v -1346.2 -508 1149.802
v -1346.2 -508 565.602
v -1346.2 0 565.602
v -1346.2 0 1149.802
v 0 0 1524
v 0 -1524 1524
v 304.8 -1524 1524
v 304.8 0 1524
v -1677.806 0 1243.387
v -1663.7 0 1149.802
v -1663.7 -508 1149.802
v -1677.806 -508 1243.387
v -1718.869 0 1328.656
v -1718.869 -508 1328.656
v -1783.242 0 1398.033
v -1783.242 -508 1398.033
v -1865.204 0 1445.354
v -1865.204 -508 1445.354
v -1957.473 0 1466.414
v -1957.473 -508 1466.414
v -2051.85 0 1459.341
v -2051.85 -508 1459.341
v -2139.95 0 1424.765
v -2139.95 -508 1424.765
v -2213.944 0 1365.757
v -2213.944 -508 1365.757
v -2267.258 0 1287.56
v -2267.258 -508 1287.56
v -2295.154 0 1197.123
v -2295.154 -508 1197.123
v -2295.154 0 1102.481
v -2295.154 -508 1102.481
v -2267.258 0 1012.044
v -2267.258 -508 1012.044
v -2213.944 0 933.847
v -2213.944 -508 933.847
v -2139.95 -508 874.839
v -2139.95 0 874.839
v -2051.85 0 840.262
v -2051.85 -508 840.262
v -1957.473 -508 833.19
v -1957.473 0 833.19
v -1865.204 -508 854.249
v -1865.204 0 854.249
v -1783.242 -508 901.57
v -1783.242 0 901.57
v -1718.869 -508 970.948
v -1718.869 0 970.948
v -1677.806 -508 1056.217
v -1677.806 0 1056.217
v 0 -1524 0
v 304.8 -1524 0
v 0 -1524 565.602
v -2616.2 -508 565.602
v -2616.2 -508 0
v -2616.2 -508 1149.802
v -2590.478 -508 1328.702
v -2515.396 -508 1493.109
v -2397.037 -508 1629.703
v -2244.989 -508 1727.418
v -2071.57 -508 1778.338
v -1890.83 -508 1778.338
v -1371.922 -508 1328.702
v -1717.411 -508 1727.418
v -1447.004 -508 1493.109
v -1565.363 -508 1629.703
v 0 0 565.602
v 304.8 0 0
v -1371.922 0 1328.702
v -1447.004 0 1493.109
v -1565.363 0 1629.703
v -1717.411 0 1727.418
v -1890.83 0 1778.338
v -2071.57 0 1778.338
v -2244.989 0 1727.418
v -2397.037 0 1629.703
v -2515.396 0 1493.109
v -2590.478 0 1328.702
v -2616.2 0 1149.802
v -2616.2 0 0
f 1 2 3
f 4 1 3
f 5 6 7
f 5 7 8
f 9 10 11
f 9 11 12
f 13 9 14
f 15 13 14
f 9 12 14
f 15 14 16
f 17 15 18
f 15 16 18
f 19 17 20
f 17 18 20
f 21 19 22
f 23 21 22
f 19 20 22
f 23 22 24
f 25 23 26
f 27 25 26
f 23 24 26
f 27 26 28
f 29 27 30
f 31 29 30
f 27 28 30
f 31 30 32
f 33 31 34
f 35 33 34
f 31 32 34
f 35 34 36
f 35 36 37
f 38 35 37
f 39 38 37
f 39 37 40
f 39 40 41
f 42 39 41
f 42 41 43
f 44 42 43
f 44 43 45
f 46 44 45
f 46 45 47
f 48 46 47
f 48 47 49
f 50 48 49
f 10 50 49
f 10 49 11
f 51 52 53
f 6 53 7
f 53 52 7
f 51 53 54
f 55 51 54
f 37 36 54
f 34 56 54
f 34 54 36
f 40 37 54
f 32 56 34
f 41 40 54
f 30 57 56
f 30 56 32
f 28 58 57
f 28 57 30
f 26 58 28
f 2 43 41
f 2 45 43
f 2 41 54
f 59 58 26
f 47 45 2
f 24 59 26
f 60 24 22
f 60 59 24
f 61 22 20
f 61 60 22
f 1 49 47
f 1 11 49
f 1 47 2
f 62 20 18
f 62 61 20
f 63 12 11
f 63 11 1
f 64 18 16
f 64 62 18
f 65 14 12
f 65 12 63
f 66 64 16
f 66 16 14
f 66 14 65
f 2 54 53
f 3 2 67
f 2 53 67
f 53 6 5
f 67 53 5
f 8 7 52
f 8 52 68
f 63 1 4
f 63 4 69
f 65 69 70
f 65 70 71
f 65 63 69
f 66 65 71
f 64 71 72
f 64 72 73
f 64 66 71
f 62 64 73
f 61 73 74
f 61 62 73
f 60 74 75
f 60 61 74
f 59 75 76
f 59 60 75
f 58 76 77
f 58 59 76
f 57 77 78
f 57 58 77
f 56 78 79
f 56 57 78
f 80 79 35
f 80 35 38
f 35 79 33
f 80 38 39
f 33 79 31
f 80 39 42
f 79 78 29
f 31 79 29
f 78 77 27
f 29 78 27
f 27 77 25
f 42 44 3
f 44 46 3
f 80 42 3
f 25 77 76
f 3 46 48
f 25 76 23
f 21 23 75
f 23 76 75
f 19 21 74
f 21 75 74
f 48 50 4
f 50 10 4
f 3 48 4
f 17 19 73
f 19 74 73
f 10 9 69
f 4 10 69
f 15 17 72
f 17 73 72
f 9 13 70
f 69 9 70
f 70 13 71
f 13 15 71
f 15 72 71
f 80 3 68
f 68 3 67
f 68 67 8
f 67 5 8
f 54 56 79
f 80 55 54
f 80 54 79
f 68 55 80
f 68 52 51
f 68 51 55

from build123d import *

# Parameters (mm, degrees)
F0_W      = 1524
F0_H      = 1524
F1_DEPTH  = 304.8
F2_W      = 1524
F2_H      = 565.6017661095
F3_DEPTH  = 2921
F4_W      = 1270
F4_H      = 508
F5_DEPTH  = 584.2
F7_DEPTH  = 508
F8_R      = 317.5
F9_DEPTH  = 25.4
F10_DEPTH = 25.4
F11_R     = 317.5
F12_DEPTH = 1930.4
F14_DEPTH = 2006.6


with BuildPart() as f1:
    # F0 (on Right) → F1 (new body)
    with BuildSketch(Plane.YZ):
        with Locations((-762, 762)):
            Rectangle(F0_W, F0_H)
    extrude(amount=F1_DEPTH)

    # F2 (on face) → F3 (join)
    with BuildSketch(Plane.YZ.offset(304.8)):
        with Locations((-762, 282.8008830547)):
            Rectangle(F2_W, F2_H)
    extrude(amount=-F3_DEPTH)

    # F4 (on face) → F5 (join)
    with BuildSketch(Plane.XY.offset(565.6017661095)):
        with Locations((-1981.2, -254)):
            Rectangle(F4_W, F4_H)
    extrude(amount=F5_DEPTH)

    # F6 (on face) → F7 (join)
    with BuildSketch(Plane.XZ.offset(508)):
        with BuildLine():
            Line((-2616.2, 1149.8017661095), (-1346.2, 1149.8017661095))
            ThreePointArc((-1346.2, 1149.8017661095), (-1981.2, 1784.8017661095), (-2616.2, 1149.8017661095))
        make_face()
    extrude(amount=-F7_DEPTH)

    # F8 (on face) → F9 (cut)
    with BuildSketch(Plane.XZ.offset(508)):
        with Locations((-1981.2, 1149.8017661095)):
            Circle(F8_R)
    extrude(amount=-F9_DEPTH, mode=Mode.SUBTRACT)

    # F10 (add): a face of the model
    f10_faces = [f1.faces().sort_by_distance(p)[0] for p in [
        (-1981.2, -482.6, 1149.8017661095),
    ]]
    extrude(f10_faces, amount=-F10_DEPTH)

    # F11 (on face) → F12 (cut)
    with BuildSketch(Plane.XZ.offset(482.6)):
        with Locations((-1981.2, 1149.8017661095)):
            Circle(F11_R)
    extrude(amount=-F12_DEPTH, mode=Mode.SUBTRACT)

    # F13 (on face) → F14 (cut)
    with BuildSketch(Plane.XY.offset(565.6017661095)):
        Polygon((0, -1524), (-2616.2, -508), (-2616.2, -1524), align=None)
    extrude(amount=-F14_DEPTH, mode=Mode.SUBTRACT)


solid = f1.part
